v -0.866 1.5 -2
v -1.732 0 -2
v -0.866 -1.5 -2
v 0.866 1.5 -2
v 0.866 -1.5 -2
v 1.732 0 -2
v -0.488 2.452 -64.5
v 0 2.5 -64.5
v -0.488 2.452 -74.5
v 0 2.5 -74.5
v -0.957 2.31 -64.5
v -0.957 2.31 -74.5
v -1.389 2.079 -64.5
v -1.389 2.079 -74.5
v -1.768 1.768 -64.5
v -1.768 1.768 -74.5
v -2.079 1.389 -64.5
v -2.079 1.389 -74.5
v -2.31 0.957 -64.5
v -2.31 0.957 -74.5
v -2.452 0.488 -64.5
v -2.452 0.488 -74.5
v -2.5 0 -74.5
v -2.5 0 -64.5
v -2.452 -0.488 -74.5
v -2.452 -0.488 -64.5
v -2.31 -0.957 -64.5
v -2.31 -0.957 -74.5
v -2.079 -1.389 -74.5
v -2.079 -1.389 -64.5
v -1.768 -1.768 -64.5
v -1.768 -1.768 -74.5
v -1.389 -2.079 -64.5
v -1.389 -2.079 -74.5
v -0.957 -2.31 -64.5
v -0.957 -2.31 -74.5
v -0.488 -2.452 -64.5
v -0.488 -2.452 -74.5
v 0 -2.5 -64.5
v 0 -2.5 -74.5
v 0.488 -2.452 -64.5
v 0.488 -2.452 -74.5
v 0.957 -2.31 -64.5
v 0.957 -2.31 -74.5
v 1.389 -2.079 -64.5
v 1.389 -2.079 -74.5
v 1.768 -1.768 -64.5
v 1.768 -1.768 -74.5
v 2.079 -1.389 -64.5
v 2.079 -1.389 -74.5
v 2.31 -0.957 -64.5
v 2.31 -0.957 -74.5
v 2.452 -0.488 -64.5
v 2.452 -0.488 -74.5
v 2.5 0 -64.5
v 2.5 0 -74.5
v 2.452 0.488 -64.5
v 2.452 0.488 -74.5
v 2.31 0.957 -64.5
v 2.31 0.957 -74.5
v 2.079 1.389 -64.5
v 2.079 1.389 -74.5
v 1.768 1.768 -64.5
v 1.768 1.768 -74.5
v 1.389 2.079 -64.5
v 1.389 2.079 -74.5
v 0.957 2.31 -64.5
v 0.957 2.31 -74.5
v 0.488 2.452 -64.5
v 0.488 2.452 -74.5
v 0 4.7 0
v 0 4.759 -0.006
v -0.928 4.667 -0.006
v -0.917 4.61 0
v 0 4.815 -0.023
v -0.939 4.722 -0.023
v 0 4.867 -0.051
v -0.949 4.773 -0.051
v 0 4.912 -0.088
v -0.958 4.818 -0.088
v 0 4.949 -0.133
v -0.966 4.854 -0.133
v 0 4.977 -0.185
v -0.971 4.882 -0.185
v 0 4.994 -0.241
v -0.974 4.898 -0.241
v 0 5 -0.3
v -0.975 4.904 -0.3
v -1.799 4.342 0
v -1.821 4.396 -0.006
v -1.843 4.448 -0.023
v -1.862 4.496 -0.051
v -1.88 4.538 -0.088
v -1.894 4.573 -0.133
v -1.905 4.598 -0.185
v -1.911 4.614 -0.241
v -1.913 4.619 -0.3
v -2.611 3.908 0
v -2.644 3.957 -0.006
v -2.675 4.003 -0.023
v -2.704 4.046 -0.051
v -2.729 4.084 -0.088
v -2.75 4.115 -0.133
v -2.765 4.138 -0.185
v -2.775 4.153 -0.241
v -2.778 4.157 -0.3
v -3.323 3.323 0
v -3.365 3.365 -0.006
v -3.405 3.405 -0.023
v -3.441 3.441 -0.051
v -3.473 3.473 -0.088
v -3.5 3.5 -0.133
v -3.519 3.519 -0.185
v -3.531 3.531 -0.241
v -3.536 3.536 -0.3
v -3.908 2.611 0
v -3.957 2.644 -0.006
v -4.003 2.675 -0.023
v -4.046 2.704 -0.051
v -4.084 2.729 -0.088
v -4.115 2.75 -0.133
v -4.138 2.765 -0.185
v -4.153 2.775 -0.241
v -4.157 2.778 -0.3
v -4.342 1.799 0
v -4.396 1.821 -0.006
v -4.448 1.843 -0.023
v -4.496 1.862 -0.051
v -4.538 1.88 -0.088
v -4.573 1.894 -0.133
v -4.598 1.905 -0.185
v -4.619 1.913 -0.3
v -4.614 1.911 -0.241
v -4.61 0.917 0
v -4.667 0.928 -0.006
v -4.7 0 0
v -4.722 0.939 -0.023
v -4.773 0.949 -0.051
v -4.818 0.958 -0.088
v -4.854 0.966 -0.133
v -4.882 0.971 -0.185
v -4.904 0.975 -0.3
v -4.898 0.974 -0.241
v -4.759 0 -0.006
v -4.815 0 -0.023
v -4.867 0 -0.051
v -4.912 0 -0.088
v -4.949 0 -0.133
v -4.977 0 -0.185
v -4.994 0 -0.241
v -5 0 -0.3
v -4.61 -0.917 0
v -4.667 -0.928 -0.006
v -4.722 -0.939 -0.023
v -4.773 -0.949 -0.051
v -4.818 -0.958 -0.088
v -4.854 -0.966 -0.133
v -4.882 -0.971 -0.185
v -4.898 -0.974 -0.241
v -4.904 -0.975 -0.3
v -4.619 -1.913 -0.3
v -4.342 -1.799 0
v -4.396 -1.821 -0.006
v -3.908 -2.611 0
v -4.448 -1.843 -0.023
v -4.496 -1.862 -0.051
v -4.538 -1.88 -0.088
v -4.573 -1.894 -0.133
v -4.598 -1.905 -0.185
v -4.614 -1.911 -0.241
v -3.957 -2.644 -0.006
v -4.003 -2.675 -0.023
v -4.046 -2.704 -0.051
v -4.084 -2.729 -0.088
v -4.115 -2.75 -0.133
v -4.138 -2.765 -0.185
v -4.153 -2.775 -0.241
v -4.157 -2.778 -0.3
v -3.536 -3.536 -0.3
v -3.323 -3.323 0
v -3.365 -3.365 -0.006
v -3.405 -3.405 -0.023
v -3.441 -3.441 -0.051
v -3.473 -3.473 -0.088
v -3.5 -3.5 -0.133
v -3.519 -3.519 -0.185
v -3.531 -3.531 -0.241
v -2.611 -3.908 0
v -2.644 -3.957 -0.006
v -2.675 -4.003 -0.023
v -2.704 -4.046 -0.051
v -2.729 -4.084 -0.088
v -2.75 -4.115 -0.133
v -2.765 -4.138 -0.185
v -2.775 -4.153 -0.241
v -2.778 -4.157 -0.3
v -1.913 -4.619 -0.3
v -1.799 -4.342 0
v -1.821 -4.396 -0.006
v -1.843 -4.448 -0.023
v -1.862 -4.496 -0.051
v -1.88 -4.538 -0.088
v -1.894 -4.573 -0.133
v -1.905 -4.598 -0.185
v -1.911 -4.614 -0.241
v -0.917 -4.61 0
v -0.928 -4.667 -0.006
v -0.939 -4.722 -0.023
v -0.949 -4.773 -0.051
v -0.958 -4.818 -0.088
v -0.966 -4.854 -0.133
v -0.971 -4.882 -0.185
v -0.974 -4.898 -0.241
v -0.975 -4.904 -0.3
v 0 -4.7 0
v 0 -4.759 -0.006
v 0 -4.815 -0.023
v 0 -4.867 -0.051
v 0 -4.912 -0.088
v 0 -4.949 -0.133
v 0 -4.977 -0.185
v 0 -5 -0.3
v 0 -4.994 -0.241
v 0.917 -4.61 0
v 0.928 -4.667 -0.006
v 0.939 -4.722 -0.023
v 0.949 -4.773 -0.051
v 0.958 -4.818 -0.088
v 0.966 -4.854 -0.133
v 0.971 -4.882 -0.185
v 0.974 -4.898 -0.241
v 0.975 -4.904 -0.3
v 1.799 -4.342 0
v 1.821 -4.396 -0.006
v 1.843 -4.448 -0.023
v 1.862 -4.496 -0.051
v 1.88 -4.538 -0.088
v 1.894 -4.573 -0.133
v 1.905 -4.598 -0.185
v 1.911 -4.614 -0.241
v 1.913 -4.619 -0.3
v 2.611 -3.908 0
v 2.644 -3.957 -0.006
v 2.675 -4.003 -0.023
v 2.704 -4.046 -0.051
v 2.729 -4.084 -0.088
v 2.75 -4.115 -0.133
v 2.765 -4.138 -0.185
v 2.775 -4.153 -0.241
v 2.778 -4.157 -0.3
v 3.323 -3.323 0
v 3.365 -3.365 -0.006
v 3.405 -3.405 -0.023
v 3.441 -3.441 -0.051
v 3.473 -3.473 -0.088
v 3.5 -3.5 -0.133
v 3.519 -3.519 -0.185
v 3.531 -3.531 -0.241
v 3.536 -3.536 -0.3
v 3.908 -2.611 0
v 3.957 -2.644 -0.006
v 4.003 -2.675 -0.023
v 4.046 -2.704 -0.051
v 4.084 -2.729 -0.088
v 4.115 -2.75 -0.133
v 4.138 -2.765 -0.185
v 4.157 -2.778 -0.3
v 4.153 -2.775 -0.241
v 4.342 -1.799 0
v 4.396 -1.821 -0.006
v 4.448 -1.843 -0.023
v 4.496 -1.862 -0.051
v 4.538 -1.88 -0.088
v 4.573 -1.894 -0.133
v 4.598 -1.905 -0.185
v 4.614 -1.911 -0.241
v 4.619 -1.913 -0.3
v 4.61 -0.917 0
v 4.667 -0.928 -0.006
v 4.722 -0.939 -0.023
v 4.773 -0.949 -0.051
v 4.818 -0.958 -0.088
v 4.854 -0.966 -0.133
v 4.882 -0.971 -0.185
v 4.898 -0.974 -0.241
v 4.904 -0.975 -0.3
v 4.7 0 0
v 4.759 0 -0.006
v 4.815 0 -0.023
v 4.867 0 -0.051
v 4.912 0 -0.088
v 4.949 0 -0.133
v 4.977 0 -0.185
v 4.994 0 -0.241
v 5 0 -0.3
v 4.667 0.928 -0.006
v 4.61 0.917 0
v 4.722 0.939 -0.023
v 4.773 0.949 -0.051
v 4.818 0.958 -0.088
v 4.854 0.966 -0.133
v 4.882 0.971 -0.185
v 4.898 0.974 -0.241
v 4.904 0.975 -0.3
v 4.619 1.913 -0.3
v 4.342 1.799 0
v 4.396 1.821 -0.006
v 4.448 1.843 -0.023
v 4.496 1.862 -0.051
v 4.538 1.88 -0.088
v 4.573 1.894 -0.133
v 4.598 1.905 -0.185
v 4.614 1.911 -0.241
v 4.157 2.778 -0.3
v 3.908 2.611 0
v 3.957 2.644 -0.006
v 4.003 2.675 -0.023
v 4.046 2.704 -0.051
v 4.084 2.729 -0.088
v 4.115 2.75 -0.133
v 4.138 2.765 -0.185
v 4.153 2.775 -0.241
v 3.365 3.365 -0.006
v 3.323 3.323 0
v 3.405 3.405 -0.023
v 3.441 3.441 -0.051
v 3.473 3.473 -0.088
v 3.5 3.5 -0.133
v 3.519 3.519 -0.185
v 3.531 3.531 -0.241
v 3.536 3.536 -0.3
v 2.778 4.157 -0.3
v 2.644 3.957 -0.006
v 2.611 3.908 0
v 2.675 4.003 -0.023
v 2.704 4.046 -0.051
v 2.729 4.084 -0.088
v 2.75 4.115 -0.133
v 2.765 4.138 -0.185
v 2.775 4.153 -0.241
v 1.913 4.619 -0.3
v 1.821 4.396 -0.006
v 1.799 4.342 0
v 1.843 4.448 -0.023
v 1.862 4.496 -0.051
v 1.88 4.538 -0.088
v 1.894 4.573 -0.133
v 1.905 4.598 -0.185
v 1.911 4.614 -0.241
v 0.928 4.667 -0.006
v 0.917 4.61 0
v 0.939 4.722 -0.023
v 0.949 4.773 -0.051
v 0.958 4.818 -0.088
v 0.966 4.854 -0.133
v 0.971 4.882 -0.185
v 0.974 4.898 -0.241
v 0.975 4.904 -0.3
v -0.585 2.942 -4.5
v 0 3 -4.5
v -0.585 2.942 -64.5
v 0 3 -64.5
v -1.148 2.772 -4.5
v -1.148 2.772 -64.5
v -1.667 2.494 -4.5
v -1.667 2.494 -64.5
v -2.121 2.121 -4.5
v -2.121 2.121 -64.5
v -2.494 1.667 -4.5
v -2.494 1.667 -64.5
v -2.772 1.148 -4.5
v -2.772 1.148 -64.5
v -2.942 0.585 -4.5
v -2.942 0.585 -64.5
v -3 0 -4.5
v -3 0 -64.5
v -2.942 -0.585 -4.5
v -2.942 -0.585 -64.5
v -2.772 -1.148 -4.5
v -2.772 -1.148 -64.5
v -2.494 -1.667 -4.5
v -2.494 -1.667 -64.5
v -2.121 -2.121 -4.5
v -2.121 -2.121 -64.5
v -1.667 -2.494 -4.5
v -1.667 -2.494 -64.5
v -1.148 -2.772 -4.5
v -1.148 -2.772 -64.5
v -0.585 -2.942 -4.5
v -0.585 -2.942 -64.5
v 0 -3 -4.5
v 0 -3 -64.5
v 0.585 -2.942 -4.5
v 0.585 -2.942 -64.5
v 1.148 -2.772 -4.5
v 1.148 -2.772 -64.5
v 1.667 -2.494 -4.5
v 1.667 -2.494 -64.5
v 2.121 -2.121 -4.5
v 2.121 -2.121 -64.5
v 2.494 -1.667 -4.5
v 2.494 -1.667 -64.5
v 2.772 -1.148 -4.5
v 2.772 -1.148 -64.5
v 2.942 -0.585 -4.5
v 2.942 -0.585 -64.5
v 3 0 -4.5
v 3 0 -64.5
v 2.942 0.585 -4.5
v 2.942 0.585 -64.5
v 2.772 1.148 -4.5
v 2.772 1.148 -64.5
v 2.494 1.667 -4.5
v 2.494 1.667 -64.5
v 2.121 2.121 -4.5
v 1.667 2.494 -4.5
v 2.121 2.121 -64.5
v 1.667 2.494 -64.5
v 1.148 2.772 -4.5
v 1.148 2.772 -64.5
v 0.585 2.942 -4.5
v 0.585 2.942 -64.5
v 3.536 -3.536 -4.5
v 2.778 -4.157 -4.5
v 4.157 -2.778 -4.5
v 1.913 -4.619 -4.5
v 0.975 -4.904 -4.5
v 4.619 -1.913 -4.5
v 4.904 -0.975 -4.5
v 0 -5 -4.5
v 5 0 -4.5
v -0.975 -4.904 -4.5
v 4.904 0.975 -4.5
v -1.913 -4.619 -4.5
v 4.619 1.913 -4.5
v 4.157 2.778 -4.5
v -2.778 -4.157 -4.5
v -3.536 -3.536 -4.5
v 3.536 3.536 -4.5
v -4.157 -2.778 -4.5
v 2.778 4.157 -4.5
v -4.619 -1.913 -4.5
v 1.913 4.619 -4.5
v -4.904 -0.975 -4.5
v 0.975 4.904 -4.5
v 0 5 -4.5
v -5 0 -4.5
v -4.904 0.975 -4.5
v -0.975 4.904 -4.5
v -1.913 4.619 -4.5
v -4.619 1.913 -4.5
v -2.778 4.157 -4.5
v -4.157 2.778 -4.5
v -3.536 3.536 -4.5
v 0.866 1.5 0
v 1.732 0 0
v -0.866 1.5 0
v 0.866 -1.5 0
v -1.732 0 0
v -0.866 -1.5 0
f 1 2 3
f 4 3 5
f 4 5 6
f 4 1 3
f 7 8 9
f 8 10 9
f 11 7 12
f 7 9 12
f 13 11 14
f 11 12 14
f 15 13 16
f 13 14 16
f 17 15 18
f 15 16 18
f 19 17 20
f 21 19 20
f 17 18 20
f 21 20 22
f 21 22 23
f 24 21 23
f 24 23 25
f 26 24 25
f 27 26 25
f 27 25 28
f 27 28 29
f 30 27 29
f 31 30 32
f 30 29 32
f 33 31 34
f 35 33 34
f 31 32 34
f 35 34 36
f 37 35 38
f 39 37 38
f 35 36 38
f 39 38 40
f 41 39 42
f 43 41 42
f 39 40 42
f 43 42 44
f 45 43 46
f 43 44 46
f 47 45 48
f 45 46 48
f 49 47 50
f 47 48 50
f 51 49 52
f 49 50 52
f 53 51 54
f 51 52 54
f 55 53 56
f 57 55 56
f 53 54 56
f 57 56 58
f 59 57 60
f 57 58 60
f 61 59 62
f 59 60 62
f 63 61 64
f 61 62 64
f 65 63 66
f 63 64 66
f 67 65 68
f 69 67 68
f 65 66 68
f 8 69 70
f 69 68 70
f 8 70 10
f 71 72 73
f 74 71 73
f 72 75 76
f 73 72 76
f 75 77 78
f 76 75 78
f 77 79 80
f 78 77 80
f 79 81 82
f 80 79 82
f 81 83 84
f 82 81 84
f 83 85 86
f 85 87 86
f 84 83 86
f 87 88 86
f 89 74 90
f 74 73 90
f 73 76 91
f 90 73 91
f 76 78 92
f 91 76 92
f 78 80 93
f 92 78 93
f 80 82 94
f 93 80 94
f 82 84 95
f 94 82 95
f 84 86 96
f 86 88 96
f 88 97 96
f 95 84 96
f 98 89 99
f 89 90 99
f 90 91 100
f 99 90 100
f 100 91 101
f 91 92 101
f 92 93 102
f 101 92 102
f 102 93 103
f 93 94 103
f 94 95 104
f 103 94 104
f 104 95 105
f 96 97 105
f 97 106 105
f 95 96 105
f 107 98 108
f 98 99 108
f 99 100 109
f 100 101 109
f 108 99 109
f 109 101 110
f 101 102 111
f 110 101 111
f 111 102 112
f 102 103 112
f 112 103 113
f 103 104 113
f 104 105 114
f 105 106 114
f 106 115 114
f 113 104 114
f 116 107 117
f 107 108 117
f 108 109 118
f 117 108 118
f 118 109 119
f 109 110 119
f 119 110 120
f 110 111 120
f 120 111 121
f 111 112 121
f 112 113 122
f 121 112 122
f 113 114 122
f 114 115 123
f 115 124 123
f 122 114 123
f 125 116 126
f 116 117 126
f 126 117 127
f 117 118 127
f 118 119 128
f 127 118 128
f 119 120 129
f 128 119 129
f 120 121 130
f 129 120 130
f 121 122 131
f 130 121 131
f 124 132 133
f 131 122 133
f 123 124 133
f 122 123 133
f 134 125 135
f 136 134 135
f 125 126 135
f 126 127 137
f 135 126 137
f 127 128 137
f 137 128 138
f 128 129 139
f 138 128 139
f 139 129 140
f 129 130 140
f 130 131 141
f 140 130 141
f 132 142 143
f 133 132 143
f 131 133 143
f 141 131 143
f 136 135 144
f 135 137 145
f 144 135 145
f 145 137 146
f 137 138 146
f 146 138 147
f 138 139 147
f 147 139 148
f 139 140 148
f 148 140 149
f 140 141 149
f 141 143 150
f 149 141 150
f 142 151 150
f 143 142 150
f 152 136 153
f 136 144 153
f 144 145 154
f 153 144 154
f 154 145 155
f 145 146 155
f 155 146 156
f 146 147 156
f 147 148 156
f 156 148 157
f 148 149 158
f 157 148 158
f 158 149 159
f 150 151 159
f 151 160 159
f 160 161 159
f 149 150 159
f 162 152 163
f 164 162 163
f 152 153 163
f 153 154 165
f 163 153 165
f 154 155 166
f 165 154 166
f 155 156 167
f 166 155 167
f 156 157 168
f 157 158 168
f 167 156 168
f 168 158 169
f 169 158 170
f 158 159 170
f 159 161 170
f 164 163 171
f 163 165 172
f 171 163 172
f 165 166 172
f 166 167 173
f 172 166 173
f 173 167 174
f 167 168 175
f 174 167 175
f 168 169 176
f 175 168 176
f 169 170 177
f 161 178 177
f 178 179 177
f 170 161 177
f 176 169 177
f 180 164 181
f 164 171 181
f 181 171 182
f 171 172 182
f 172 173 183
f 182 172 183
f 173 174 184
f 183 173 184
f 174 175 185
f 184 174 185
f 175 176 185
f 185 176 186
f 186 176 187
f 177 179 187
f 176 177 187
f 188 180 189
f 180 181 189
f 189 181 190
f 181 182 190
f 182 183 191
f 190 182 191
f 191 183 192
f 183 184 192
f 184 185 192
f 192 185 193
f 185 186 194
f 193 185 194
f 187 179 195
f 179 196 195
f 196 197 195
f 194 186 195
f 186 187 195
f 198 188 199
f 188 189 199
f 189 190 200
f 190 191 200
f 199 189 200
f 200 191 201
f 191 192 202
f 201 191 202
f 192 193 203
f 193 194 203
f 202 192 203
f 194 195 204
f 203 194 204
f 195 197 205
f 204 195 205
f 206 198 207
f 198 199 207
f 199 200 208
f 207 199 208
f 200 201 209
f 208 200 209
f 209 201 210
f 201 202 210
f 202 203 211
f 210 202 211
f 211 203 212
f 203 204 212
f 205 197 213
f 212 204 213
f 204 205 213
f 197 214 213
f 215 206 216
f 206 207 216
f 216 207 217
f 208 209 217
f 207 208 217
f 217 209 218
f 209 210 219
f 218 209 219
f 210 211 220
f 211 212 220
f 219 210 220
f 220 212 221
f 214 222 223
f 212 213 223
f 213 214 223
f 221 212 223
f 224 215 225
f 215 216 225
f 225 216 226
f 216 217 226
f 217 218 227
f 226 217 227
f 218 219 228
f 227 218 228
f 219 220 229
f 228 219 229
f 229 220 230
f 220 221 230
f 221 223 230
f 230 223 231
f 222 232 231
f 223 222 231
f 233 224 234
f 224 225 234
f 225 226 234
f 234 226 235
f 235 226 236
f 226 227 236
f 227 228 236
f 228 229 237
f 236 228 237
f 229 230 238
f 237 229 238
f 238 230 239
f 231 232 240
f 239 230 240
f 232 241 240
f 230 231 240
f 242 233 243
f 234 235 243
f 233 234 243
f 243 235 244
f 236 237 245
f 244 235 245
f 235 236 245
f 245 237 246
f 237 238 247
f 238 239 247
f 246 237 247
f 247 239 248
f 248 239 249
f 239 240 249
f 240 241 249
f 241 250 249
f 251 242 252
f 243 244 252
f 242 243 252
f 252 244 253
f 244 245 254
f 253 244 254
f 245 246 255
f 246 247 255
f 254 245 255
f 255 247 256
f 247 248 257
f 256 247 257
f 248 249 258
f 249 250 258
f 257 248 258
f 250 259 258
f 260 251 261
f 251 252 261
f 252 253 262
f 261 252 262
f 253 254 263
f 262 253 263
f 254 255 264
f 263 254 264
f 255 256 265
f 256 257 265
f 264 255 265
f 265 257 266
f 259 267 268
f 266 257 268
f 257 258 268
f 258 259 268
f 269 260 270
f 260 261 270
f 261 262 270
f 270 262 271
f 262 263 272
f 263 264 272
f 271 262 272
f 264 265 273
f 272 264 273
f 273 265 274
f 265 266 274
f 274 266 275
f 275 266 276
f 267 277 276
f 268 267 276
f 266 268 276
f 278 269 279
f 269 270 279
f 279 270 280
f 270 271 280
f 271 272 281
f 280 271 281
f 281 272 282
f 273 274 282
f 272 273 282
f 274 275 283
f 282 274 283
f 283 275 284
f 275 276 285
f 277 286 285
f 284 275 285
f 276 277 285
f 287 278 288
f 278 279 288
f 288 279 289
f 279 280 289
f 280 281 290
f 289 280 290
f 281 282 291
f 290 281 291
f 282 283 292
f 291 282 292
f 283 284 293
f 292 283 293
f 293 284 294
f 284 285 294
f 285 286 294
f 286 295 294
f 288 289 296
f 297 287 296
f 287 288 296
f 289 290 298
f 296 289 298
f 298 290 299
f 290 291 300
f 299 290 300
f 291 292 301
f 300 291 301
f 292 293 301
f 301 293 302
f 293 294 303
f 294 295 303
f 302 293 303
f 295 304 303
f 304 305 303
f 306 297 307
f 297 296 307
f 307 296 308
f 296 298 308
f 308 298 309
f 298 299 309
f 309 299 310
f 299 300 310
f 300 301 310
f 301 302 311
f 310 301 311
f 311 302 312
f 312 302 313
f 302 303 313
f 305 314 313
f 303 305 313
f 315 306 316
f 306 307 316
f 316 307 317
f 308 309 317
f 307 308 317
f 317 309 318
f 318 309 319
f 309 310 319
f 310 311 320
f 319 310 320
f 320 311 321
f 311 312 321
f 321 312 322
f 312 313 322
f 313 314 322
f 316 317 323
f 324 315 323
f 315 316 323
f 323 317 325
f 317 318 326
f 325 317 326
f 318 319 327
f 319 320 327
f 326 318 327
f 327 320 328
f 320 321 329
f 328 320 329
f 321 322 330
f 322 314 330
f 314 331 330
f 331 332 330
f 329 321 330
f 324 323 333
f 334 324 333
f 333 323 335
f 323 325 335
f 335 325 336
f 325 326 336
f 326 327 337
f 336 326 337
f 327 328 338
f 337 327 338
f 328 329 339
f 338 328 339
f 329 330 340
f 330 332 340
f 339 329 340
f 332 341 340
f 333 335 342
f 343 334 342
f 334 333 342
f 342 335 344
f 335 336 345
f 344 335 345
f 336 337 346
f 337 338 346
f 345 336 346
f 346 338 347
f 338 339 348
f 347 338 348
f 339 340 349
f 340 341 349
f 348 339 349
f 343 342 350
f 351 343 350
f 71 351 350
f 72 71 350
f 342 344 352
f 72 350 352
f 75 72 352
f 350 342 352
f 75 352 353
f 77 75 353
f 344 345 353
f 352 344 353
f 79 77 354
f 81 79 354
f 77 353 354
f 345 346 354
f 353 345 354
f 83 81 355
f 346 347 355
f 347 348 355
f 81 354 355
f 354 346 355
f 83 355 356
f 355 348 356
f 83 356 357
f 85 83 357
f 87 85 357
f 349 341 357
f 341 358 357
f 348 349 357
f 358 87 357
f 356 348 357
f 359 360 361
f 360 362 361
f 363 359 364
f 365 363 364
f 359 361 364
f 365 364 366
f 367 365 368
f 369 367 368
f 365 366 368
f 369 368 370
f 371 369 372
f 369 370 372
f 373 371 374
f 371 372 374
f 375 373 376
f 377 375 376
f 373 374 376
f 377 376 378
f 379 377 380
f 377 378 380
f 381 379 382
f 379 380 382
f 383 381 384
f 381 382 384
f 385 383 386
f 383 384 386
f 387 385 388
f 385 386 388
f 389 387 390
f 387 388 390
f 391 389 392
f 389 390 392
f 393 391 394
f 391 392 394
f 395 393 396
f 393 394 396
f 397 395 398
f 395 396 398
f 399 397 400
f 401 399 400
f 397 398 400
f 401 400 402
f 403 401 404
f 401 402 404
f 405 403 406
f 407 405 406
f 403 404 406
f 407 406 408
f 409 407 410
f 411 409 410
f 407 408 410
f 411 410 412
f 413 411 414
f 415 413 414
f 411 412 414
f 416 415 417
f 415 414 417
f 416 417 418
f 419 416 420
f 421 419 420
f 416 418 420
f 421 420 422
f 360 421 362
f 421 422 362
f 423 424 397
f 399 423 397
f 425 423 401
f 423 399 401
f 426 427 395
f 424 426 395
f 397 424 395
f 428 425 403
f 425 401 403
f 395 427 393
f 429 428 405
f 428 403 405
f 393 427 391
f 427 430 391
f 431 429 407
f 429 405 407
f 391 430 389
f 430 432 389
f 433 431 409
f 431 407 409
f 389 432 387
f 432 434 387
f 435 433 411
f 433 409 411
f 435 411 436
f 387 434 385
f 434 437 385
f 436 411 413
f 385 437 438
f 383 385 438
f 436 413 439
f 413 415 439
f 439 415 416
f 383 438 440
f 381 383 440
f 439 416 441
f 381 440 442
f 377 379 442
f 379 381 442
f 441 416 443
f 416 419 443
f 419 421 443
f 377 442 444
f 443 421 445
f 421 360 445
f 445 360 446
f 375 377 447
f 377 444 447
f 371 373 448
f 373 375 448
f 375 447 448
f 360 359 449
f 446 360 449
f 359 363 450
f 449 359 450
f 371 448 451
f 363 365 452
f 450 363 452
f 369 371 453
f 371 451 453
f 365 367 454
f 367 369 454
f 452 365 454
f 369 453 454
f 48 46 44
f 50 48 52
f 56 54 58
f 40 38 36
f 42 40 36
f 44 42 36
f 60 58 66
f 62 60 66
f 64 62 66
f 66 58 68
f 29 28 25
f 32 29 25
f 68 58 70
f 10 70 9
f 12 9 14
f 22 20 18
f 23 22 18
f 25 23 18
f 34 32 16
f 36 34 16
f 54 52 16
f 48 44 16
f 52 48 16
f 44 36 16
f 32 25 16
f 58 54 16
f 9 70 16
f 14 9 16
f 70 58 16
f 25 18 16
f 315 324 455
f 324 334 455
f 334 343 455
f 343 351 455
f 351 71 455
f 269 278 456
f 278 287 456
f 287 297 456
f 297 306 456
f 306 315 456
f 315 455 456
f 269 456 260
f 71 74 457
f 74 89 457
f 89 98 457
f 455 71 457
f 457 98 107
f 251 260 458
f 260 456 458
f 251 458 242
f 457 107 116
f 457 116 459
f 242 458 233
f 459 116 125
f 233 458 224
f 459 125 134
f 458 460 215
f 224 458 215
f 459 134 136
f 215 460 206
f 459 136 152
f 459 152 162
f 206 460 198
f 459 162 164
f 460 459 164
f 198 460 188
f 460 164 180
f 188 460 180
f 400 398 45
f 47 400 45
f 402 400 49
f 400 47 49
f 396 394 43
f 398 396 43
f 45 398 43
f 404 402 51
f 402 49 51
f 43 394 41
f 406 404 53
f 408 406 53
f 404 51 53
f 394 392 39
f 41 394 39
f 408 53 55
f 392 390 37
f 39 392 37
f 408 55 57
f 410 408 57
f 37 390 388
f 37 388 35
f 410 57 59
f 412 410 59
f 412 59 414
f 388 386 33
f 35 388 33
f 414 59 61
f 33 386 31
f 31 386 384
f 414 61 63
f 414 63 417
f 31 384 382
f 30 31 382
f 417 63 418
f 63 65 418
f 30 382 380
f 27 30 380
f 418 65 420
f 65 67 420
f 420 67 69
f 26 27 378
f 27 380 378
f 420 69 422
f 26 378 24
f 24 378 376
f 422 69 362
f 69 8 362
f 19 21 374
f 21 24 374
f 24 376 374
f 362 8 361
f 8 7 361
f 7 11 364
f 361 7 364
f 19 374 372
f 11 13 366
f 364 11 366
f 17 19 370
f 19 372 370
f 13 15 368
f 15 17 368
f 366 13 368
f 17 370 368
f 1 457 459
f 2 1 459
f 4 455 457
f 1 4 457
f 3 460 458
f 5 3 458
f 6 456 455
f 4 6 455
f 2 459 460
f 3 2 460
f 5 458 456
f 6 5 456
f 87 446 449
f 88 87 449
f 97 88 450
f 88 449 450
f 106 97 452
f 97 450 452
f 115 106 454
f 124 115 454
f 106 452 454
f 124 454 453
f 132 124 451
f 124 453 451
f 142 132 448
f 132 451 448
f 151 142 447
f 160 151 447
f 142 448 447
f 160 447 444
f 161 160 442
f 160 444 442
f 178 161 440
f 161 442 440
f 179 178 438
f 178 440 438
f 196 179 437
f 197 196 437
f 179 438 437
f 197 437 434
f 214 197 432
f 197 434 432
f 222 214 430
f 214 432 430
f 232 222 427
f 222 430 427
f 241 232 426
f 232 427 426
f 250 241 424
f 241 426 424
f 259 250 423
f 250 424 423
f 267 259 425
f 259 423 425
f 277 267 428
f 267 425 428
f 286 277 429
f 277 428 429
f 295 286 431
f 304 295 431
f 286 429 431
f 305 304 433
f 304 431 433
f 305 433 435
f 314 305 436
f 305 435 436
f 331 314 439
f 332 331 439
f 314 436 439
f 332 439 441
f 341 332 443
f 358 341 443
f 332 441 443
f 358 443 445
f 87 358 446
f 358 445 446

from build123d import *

# Parameters (mm, degrees)
CUT_EXTRUDE_1_DEPTH = 2
FILLET_1_R          = 0.3


with BuildPart() as part:
    # 草图1 → 旋转1 (revolve)
    with BuildSketch(Plane(origin=(0, 0, 0), x_dir=(0, 0, -1), z_dir=(1, 0, 0))):
        Polygon((0, 0), (0, 5), (4.5, 5), (4.5, 3), (64.5, 3), (64.5, 2.5), (74.5, 2.5), (74.5, 0), align=None)
    revolve(axis=Axis((0, 0, -74.5), (0, 0, 1)))

    # 草图2 → 切除-拉伸1 (cut)
    with BuildSketch(Plane.XY):
        Polygon((0.866025404, 1.5), (-0.866025404, 1.5), (-1.732050808, 0), (-0.866025404, -1.5), (0.866025404, -1.5), (1.732050808, 0), align=None)
    extrude(amount=-CUT_EXTRUDE_1_DEPTH, mode=Mode.SUBTRACT)

    # 圆角1
    fillet_1_edges = [part.edges().sort_by_distance(p)[0] for p in [
        (0, -5, 0),
    ]]
    fillet(fillet_1_edges, radius=FILLET_1_R)


solid = part.part
